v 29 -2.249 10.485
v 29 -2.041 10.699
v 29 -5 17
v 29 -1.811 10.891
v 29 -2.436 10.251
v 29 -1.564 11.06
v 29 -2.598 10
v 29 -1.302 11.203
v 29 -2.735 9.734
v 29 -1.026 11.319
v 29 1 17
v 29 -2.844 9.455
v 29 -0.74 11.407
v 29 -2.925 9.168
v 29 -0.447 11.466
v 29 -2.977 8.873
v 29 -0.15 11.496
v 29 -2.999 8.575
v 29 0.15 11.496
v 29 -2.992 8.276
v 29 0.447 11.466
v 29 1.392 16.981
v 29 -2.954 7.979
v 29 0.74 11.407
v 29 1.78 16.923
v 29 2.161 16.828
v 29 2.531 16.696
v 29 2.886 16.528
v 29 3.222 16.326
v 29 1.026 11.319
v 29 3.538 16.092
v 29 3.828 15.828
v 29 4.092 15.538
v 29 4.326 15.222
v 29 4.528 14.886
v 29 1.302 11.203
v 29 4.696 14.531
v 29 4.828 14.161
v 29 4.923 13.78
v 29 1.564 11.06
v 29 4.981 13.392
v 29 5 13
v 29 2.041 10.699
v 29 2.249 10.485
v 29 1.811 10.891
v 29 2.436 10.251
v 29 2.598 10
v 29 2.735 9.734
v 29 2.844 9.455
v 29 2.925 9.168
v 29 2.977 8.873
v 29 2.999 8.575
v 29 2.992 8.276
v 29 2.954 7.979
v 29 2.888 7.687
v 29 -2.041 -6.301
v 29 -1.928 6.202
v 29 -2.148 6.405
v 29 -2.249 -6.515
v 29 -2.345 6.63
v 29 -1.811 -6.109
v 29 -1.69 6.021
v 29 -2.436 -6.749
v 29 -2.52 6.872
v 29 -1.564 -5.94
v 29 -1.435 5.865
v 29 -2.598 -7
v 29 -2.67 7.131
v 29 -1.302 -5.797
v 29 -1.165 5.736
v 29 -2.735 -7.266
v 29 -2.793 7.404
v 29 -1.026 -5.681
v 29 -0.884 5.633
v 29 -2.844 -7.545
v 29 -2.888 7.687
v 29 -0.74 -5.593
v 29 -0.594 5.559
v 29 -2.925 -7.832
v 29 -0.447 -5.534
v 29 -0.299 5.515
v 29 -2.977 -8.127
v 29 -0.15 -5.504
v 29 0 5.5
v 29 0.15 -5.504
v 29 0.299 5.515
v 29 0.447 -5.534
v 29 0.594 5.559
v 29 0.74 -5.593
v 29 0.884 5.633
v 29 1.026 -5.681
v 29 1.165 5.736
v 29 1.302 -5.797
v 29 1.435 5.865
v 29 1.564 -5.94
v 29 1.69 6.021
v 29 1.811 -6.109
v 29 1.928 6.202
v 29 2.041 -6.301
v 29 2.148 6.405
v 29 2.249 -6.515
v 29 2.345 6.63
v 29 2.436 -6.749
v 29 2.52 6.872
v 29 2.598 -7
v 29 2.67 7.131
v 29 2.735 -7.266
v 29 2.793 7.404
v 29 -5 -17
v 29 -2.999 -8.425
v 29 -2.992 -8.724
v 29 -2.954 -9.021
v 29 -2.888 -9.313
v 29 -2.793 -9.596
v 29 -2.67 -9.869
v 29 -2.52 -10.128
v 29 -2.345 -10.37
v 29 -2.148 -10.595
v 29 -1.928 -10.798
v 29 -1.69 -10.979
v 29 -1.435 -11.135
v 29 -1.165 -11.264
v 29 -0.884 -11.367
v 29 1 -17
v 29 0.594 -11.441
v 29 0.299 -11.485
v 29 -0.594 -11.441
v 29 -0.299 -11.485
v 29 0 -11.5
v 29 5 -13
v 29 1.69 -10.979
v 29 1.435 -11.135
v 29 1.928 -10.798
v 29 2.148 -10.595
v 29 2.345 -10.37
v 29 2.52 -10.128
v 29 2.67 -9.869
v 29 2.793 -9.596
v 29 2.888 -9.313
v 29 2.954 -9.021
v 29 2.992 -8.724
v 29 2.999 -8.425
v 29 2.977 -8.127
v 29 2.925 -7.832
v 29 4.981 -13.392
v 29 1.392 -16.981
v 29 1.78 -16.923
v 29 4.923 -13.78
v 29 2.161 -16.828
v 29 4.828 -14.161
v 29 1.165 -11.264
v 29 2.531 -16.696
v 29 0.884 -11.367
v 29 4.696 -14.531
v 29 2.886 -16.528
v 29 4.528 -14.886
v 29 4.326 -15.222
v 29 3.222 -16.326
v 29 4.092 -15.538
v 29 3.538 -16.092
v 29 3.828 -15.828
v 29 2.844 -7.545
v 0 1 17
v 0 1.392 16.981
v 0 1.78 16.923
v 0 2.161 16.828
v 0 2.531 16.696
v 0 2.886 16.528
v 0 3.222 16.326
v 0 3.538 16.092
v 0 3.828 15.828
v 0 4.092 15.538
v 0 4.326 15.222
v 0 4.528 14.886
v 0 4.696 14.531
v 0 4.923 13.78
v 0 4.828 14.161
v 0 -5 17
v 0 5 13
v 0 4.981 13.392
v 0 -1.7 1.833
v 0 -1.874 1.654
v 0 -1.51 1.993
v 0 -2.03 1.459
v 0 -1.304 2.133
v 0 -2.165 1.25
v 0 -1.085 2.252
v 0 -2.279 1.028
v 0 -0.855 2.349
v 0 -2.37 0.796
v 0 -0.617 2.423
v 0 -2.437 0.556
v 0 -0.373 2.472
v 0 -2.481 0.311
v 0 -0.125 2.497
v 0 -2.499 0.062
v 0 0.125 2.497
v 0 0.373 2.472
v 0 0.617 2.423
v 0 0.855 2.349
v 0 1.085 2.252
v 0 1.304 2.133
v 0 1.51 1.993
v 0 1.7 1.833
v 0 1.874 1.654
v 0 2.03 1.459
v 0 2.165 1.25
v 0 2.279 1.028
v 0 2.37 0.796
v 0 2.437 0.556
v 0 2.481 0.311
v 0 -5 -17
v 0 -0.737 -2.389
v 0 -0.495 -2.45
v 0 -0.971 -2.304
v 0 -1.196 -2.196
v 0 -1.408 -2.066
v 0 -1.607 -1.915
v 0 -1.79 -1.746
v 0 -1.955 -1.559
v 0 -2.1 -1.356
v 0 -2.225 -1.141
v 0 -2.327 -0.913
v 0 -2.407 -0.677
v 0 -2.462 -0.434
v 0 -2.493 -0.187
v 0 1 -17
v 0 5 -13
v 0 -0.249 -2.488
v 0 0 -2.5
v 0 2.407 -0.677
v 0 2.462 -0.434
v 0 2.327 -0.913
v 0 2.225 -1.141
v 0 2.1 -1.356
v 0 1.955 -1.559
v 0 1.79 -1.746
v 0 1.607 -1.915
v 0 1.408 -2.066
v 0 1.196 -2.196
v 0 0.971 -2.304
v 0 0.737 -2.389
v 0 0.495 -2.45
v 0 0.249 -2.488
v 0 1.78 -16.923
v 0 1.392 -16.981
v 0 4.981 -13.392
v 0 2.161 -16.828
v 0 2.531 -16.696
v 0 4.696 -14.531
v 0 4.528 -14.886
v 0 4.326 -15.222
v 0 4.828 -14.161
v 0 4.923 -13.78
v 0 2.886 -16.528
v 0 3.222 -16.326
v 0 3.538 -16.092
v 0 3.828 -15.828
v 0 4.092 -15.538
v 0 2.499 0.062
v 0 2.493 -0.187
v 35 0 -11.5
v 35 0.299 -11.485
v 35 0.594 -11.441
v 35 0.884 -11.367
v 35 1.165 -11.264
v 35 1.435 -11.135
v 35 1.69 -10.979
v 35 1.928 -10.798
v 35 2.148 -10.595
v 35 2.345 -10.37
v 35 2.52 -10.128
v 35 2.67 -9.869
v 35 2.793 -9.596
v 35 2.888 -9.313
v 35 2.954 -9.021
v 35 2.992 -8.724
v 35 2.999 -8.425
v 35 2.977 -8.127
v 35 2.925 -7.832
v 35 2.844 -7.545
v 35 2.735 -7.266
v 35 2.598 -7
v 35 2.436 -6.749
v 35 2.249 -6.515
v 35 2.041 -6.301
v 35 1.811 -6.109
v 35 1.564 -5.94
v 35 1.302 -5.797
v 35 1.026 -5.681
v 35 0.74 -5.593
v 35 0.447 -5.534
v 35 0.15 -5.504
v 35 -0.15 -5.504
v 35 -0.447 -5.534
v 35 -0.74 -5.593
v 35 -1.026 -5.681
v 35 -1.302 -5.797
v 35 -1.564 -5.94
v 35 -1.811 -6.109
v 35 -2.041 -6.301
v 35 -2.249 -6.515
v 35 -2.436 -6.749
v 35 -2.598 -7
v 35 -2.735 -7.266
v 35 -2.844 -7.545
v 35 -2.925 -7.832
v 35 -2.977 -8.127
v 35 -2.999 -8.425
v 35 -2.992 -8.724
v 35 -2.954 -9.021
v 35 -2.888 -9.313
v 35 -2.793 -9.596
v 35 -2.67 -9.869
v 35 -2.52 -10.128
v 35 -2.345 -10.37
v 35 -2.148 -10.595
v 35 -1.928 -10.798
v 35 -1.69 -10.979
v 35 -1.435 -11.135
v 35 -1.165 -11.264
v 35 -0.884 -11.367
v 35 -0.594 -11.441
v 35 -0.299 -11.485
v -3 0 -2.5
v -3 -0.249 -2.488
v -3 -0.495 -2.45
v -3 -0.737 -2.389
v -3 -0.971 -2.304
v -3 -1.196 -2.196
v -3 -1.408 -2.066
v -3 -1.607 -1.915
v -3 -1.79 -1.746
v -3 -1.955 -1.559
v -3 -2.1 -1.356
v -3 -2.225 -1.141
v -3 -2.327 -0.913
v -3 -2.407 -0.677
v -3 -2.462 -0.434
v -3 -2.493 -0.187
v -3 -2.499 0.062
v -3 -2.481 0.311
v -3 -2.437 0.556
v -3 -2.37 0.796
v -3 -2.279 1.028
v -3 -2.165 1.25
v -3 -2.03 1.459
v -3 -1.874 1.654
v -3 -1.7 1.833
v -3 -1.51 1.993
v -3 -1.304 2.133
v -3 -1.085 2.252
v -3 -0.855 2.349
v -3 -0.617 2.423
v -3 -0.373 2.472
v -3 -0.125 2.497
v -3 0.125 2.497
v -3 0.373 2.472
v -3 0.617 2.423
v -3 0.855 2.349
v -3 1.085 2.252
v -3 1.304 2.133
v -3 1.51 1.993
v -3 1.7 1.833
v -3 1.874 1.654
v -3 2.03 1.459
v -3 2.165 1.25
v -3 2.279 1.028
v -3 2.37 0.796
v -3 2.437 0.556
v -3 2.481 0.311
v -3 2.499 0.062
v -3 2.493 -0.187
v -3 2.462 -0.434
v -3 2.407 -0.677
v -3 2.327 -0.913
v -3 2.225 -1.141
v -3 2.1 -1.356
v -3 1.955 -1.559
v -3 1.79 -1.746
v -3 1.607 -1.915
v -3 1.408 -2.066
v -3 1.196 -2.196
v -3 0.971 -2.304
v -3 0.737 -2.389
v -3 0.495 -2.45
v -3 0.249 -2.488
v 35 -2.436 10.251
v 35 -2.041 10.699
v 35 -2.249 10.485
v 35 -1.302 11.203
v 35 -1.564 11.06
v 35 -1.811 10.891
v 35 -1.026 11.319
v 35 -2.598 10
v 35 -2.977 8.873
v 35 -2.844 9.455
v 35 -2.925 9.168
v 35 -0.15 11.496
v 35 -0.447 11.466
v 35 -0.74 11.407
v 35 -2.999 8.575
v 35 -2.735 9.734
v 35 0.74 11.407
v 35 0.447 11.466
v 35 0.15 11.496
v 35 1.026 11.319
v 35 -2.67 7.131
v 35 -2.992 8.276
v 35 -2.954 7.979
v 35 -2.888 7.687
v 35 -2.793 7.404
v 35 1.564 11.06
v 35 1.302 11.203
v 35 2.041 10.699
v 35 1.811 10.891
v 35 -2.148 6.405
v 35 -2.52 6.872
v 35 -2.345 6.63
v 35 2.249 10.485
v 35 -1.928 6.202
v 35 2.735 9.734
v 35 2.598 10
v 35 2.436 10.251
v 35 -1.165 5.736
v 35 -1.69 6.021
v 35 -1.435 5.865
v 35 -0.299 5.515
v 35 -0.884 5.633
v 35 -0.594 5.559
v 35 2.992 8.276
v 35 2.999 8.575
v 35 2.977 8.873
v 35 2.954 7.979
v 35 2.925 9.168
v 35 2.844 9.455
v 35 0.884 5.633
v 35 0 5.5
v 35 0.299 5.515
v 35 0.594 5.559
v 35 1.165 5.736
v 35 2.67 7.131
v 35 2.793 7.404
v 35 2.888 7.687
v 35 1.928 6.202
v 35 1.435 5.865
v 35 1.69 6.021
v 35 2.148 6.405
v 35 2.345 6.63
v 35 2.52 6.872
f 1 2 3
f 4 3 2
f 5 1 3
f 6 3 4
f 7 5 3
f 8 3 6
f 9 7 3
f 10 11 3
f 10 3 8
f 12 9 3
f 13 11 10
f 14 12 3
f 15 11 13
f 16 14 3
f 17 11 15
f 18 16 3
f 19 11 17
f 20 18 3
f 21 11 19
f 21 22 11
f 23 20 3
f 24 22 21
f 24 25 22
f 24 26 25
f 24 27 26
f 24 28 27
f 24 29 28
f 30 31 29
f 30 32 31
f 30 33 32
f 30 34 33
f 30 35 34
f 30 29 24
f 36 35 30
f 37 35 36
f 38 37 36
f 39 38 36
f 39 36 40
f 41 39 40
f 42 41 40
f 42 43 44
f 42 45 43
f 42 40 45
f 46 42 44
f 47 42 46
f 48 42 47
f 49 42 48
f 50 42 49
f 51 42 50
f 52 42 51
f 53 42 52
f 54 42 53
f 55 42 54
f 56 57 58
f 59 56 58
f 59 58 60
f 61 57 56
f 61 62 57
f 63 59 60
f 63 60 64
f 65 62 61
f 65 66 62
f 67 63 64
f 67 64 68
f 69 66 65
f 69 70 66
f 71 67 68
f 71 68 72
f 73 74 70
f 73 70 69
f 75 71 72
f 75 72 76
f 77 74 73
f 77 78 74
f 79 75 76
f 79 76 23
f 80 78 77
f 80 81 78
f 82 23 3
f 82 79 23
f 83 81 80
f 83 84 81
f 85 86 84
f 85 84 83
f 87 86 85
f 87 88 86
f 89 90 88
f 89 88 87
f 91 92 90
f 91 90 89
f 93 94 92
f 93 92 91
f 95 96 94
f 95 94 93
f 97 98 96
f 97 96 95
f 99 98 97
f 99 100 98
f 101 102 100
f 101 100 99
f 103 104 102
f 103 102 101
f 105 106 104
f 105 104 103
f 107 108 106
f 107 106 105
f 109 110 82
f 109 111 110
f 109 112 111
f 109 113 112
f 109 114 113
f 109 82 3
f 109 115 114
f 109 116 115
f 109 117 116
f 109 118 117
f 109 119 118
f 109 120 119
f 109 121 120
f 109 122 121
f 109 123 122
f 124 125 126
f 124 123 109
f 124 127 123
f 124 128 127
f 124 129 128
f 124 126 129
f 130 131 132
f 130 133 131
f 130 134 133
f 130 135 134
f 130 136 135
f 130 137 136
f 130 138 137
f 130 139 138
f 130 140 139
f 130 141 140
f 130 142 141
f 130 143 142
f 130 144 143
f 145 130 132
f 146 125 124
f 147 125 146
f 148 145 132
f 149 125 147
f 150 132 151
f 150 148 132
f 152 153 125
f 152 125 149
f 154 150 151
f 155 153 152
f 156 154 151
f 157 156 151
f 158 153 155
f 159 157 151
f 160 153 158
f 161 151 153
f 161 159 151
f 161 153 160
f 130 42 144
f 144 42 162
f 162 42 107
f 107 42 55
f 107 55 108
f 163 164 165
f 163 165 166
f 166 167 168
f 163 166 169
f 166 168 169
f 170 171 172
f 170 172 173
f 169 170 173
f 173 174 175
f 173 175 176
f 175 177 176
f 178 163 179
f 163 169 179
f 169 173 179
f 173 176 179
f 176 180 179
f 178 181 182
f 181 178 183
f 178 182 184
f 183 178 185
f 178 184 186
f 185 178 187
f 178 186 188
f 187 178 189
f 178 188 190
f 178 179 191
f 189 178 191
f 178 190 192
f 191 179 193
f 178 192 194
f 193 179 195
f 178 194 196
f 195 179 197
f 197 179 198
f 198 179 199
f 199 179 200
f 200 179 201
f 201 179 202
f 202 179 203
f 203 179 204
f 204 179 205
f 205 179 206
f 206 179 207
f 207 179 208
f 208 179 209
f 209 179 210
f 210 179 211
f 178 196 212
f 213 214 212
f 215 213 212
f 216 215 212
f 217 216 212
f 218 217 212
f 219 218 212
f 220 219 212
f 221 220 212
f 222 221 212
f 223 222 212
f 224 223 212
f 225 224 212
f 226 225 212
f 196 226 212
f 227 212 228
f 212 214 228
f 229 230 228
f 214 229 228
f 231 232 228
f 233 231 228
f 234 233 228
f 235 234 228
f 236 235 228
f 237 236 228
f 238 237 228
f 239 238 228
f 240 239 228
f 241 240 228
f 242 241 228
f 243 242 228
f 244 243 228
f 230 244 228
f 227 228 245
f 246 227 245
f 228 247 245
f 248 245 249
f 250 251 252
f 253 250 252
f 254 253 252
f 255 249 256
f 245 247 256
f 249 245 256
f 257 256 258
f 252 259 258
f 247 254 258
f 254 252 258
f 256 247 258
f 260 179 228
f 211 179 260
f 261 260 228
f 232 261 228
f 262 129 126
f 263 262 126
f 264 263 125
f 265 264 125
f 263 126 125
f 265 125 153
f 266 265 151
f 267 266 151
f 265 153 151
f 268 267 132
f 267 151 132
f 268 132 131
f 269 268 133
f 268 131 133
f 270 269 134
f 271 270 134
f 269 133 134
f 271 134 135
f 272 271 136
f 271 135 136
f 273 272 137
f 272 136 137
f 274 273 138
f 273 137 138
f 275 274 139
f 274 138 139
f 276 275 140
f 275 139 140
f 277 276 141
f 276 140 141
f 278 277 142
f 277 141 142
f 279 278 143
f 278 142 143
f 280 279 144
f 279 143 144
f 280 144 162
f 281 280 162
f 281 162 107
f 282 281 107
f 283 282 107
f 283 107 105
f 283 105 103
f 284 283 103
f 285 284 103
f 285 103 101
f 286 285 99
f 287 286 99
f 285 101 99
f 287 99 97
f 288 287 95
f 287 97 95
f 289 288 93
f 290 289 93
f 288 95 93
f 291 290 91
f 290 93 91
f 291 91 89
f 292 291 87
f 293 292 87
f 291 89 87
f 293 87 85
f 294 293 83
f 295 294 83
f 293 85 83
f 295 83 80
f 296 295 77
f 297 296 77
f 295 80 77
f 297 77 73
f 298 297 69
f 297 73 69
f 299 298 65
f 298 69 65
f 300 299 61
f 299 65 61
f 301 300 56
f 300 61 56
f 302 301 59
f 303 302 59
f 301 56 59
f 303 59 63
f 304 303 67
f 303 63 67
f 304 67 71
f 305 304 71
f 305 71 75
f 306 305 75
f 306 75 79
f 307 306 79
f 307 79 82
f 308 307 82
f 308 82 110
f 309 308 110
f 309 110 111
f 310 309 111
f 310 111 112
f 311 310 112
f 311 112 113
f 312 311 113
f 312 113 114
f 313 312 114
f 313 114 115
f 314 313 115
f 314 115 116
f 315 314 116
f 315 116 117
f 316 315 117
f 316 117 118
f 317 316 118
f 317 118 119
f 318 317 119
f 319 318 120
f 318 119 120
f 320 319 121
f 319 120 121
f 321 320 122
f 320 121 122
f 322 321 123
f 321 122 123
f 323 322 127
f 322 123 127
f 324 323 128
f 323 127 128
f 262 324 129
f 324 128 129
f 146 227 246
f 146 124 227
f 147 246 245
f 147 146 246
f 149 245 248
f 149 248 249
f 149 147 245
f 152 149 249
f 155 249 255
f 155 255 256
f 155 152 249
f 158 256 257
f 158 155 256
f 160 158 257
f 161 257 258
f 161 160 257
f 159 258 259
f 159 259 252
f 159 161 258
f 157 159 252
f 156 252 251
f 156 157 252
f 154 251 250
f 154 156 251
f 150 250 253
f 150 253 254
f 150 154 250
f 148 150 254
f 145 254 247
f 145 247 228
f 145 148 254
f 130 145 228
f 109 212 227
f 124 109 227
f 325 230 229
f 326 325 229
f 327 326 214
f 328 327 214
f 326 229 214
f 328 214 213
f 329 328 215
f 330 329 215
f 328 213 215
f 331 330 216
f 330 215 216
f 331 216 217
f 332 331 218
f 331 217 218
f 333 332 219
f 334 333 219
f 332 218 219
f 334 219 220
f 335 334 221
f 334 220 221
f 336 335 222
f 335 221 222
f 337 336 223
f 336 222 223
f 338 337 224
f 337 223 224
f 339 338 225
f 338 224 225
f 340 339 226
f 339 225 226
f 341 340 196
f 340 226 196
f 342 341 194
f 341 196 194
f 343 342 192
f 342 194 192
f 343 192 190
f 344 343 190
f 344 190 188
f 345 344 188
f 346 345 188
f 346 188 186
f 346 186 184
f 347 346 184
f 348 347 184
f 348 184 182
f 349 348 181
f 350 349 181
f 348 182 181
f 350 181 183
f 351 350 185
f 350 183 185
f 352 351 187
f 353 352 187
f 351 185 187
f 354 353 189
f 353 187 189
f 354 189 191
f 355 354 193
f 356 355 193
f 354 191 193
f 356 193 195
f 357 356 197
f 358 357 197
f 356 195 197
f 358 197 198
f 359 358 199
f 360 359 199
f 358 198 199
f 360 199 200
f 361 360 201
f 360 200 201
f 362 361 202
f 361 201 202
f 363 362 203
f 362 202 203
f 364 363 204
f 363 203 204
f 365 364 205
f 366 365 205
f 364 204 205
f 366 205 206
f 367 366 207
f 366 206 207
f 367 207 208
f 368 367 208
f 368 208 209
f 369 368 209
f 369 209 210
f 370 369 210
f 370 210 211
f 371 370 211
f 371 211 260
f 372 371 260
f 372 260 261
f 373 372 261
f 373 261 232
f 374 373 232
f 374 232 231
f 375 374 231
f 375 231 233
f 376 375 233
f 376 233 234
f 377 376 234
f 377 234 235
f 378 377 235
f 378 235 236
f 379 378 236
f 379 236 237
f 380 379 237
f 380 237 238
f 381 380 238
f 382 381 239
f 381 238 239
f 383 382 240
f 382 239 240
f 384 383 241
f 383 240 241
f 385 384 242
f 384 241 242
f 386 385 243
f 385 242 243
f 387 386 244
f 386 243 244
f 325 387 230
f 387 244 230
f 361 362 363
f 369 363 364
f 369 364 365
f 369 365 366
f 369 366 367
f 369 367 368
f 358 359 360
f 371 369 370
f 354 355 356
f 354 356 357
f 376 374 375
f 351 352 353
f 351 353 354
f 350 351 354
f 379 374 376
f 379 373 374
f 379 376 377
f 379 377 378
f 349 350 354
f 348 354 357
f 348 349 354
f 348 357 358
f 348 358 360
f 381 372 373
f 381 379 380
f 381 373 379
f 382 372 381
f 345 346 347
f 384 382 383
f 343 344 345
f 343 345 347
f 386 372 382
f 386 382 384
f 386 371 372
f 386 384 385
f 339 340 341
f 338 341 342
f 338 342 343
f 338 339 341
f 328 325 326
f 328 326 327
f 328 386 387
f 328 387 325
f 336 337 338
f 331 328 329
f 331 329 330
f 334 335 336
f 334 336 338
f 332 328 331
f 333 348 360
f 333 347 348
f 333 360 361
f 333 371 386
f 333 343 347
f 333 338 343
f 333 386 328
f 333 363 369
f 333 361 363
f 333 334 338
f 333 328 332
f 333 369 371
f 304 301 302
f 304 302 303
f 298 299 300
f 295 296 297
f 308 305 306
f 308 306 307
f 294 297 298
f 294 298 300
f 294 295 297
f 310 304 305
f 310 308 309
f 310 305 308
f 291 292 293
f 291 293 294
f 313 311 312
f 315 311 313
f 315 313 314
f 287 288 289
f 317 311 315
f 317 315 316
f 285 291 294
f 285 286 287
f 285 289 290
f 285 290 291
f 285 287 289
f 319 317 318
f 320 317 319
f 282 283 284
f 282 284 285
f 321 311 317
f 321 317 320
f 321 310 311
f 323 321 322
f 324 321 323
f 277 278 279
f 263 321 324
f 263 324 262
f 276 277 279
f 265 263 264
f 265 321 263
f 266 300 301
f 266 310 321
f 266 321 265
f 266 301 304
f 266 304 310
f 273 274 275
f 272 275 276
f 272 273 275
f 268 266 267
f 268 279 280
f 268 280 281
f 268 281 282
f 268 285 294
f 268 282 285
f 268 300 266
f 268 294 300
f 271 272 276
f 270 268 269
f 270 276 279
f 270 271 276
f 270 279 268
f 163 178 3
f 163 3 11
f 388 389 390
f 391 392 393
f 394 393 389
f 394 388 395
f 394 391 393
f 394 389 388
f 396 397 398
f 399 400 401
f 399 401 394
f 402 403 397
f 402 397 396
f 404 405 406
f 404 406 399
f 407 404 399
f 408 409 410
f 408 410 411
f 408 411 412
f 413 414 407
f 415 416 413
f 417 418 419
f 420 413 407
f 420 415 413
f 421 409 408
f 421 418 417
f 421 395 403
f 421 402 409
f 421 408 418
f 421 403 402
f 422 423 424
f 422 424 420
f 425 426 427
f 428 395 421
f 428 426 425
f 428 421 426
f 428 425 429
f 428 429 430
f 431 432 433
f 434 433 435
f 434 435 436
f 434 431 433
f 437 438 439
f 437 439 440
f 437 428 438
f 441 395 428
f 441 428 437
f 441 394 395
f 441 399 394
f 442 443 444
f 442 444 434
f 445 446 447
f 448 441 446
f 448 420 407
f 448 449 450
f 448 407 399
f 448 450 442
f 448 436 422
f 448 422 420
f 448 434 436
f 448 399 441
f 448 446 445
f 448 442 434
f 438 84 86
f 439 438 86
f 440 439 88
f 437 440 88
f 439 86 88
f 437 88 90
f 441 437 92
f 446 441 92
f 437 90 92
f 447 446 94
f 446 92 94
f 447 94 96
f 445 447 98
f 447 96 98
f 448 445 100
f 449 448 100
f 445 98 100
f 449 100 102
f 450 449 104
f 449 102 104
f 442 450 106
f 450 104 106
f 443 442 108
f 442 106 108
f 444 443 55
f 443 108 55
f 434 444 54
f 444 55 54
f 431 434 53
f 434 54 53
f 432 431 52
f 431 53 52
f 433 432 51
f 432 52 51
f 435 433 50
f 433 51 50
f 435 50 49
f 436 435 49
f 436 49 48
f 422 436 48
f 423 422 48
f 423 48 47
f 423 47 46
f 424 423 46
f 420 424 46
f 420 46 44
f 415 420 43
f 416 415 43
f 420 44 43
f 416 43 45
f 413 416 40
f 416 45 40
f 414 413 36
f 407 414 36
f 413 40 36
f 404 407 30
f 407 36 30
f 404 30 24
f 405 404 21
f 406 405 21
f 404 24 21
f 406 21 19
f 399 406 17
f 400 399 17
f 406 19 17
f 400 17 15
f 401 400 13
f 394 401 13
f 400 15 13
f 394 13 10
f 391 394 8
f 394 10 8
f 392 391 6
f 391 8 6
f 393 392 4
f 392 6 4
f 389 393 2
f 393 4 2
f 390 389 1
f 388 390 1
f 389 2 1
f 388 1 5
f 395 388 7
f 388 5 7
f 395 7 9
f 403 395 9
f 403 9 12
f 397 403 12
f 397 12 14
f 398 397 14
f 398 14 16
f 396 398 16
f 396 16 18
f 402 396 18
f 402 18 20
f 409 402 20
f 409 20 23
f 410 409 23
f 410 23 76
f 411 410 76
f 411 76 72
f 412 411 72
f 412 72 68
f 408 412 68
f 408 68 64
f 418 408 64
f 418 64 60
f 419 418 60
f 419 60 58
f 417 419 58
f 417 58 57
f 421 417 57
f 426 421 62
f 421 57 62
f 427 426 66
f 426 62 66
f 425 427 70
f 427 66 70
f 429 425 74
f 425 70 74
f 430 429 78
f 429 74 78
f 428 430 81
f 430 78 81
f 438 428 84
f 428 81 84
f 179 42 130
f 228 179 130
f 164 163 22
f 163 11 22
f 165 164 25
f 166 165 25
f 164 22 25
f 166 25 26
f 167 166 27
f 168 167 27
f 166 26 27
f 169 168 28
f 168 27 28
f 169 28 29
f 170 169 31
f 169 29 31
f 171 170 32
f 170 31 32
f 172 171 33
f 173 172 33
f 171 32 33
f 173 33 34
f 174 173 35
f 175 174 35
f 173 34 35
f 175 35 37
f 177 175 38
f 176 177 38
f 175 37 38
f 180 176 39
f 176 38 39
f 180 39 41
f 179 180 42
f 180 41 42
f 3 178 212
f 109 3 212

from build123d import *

# Parameters (mm, degrees)
ESBO_O1_W                = 34
ESBO_O1_H                = 10
RESSALTO_EXTRUS_O1_DEPTH = 29
FILETE1_R                = 4
ESBO_O2_R                = 3
RESSALTO_EXTRUS_O2_DEPTH = 6
ESBO_O3_R                = 2.5
RESSALTO_EXTRUS_O3_DEPTH = 3


with BuildPart() as part:
    # Esboço1 → Ressalto-extrusão1 (new body)
    with BuildSketch(Plane(origin=(0, 0, 0), x_dir=(0, 0, -1), z_dir=(1, 0, 0))):
        Rectangle(ESBO_O1_W, ESBO_O1_H)
    extrude(amount=RESSALTO_EXTRUS_O1_DEPTH)

    # Filete1
    filete1_edges = [part.edges().sort_by_distance(p)[0] for p in [
        (14.5, 5, 17),
        (14.5, 5, -17),
    ]]
    fillet(filete1_edges, radius=FILETE1_R)

    # Esboço2 → Ressalto-extrusão2 (add)
    with BuildSketch(Plane(origin=(29, 0, 0), x_dir=(0, 0, -1), z_dir=(1, 0, 0))):
        with Locations((-8.5, 0)):
            Circle(ESBO_O2_R)
        with Locations((8.5, 0)):
            Circle(ESBO_O2_R)
    extrude(amount=RESSALTO_EXTRUS_O2_DEPTH)

    # Esboço3 → Ressalto-extrusão3 (add)
    with BuildSketch(Plane.ZY):
        with Locations(Location((0, 0, 0), (0, 0, 180))):
            Circle(ESBO_O3_R)
    extrude(amount=RESSALTO_EXTRUS_O3_DEPTH)


solid = part.part
